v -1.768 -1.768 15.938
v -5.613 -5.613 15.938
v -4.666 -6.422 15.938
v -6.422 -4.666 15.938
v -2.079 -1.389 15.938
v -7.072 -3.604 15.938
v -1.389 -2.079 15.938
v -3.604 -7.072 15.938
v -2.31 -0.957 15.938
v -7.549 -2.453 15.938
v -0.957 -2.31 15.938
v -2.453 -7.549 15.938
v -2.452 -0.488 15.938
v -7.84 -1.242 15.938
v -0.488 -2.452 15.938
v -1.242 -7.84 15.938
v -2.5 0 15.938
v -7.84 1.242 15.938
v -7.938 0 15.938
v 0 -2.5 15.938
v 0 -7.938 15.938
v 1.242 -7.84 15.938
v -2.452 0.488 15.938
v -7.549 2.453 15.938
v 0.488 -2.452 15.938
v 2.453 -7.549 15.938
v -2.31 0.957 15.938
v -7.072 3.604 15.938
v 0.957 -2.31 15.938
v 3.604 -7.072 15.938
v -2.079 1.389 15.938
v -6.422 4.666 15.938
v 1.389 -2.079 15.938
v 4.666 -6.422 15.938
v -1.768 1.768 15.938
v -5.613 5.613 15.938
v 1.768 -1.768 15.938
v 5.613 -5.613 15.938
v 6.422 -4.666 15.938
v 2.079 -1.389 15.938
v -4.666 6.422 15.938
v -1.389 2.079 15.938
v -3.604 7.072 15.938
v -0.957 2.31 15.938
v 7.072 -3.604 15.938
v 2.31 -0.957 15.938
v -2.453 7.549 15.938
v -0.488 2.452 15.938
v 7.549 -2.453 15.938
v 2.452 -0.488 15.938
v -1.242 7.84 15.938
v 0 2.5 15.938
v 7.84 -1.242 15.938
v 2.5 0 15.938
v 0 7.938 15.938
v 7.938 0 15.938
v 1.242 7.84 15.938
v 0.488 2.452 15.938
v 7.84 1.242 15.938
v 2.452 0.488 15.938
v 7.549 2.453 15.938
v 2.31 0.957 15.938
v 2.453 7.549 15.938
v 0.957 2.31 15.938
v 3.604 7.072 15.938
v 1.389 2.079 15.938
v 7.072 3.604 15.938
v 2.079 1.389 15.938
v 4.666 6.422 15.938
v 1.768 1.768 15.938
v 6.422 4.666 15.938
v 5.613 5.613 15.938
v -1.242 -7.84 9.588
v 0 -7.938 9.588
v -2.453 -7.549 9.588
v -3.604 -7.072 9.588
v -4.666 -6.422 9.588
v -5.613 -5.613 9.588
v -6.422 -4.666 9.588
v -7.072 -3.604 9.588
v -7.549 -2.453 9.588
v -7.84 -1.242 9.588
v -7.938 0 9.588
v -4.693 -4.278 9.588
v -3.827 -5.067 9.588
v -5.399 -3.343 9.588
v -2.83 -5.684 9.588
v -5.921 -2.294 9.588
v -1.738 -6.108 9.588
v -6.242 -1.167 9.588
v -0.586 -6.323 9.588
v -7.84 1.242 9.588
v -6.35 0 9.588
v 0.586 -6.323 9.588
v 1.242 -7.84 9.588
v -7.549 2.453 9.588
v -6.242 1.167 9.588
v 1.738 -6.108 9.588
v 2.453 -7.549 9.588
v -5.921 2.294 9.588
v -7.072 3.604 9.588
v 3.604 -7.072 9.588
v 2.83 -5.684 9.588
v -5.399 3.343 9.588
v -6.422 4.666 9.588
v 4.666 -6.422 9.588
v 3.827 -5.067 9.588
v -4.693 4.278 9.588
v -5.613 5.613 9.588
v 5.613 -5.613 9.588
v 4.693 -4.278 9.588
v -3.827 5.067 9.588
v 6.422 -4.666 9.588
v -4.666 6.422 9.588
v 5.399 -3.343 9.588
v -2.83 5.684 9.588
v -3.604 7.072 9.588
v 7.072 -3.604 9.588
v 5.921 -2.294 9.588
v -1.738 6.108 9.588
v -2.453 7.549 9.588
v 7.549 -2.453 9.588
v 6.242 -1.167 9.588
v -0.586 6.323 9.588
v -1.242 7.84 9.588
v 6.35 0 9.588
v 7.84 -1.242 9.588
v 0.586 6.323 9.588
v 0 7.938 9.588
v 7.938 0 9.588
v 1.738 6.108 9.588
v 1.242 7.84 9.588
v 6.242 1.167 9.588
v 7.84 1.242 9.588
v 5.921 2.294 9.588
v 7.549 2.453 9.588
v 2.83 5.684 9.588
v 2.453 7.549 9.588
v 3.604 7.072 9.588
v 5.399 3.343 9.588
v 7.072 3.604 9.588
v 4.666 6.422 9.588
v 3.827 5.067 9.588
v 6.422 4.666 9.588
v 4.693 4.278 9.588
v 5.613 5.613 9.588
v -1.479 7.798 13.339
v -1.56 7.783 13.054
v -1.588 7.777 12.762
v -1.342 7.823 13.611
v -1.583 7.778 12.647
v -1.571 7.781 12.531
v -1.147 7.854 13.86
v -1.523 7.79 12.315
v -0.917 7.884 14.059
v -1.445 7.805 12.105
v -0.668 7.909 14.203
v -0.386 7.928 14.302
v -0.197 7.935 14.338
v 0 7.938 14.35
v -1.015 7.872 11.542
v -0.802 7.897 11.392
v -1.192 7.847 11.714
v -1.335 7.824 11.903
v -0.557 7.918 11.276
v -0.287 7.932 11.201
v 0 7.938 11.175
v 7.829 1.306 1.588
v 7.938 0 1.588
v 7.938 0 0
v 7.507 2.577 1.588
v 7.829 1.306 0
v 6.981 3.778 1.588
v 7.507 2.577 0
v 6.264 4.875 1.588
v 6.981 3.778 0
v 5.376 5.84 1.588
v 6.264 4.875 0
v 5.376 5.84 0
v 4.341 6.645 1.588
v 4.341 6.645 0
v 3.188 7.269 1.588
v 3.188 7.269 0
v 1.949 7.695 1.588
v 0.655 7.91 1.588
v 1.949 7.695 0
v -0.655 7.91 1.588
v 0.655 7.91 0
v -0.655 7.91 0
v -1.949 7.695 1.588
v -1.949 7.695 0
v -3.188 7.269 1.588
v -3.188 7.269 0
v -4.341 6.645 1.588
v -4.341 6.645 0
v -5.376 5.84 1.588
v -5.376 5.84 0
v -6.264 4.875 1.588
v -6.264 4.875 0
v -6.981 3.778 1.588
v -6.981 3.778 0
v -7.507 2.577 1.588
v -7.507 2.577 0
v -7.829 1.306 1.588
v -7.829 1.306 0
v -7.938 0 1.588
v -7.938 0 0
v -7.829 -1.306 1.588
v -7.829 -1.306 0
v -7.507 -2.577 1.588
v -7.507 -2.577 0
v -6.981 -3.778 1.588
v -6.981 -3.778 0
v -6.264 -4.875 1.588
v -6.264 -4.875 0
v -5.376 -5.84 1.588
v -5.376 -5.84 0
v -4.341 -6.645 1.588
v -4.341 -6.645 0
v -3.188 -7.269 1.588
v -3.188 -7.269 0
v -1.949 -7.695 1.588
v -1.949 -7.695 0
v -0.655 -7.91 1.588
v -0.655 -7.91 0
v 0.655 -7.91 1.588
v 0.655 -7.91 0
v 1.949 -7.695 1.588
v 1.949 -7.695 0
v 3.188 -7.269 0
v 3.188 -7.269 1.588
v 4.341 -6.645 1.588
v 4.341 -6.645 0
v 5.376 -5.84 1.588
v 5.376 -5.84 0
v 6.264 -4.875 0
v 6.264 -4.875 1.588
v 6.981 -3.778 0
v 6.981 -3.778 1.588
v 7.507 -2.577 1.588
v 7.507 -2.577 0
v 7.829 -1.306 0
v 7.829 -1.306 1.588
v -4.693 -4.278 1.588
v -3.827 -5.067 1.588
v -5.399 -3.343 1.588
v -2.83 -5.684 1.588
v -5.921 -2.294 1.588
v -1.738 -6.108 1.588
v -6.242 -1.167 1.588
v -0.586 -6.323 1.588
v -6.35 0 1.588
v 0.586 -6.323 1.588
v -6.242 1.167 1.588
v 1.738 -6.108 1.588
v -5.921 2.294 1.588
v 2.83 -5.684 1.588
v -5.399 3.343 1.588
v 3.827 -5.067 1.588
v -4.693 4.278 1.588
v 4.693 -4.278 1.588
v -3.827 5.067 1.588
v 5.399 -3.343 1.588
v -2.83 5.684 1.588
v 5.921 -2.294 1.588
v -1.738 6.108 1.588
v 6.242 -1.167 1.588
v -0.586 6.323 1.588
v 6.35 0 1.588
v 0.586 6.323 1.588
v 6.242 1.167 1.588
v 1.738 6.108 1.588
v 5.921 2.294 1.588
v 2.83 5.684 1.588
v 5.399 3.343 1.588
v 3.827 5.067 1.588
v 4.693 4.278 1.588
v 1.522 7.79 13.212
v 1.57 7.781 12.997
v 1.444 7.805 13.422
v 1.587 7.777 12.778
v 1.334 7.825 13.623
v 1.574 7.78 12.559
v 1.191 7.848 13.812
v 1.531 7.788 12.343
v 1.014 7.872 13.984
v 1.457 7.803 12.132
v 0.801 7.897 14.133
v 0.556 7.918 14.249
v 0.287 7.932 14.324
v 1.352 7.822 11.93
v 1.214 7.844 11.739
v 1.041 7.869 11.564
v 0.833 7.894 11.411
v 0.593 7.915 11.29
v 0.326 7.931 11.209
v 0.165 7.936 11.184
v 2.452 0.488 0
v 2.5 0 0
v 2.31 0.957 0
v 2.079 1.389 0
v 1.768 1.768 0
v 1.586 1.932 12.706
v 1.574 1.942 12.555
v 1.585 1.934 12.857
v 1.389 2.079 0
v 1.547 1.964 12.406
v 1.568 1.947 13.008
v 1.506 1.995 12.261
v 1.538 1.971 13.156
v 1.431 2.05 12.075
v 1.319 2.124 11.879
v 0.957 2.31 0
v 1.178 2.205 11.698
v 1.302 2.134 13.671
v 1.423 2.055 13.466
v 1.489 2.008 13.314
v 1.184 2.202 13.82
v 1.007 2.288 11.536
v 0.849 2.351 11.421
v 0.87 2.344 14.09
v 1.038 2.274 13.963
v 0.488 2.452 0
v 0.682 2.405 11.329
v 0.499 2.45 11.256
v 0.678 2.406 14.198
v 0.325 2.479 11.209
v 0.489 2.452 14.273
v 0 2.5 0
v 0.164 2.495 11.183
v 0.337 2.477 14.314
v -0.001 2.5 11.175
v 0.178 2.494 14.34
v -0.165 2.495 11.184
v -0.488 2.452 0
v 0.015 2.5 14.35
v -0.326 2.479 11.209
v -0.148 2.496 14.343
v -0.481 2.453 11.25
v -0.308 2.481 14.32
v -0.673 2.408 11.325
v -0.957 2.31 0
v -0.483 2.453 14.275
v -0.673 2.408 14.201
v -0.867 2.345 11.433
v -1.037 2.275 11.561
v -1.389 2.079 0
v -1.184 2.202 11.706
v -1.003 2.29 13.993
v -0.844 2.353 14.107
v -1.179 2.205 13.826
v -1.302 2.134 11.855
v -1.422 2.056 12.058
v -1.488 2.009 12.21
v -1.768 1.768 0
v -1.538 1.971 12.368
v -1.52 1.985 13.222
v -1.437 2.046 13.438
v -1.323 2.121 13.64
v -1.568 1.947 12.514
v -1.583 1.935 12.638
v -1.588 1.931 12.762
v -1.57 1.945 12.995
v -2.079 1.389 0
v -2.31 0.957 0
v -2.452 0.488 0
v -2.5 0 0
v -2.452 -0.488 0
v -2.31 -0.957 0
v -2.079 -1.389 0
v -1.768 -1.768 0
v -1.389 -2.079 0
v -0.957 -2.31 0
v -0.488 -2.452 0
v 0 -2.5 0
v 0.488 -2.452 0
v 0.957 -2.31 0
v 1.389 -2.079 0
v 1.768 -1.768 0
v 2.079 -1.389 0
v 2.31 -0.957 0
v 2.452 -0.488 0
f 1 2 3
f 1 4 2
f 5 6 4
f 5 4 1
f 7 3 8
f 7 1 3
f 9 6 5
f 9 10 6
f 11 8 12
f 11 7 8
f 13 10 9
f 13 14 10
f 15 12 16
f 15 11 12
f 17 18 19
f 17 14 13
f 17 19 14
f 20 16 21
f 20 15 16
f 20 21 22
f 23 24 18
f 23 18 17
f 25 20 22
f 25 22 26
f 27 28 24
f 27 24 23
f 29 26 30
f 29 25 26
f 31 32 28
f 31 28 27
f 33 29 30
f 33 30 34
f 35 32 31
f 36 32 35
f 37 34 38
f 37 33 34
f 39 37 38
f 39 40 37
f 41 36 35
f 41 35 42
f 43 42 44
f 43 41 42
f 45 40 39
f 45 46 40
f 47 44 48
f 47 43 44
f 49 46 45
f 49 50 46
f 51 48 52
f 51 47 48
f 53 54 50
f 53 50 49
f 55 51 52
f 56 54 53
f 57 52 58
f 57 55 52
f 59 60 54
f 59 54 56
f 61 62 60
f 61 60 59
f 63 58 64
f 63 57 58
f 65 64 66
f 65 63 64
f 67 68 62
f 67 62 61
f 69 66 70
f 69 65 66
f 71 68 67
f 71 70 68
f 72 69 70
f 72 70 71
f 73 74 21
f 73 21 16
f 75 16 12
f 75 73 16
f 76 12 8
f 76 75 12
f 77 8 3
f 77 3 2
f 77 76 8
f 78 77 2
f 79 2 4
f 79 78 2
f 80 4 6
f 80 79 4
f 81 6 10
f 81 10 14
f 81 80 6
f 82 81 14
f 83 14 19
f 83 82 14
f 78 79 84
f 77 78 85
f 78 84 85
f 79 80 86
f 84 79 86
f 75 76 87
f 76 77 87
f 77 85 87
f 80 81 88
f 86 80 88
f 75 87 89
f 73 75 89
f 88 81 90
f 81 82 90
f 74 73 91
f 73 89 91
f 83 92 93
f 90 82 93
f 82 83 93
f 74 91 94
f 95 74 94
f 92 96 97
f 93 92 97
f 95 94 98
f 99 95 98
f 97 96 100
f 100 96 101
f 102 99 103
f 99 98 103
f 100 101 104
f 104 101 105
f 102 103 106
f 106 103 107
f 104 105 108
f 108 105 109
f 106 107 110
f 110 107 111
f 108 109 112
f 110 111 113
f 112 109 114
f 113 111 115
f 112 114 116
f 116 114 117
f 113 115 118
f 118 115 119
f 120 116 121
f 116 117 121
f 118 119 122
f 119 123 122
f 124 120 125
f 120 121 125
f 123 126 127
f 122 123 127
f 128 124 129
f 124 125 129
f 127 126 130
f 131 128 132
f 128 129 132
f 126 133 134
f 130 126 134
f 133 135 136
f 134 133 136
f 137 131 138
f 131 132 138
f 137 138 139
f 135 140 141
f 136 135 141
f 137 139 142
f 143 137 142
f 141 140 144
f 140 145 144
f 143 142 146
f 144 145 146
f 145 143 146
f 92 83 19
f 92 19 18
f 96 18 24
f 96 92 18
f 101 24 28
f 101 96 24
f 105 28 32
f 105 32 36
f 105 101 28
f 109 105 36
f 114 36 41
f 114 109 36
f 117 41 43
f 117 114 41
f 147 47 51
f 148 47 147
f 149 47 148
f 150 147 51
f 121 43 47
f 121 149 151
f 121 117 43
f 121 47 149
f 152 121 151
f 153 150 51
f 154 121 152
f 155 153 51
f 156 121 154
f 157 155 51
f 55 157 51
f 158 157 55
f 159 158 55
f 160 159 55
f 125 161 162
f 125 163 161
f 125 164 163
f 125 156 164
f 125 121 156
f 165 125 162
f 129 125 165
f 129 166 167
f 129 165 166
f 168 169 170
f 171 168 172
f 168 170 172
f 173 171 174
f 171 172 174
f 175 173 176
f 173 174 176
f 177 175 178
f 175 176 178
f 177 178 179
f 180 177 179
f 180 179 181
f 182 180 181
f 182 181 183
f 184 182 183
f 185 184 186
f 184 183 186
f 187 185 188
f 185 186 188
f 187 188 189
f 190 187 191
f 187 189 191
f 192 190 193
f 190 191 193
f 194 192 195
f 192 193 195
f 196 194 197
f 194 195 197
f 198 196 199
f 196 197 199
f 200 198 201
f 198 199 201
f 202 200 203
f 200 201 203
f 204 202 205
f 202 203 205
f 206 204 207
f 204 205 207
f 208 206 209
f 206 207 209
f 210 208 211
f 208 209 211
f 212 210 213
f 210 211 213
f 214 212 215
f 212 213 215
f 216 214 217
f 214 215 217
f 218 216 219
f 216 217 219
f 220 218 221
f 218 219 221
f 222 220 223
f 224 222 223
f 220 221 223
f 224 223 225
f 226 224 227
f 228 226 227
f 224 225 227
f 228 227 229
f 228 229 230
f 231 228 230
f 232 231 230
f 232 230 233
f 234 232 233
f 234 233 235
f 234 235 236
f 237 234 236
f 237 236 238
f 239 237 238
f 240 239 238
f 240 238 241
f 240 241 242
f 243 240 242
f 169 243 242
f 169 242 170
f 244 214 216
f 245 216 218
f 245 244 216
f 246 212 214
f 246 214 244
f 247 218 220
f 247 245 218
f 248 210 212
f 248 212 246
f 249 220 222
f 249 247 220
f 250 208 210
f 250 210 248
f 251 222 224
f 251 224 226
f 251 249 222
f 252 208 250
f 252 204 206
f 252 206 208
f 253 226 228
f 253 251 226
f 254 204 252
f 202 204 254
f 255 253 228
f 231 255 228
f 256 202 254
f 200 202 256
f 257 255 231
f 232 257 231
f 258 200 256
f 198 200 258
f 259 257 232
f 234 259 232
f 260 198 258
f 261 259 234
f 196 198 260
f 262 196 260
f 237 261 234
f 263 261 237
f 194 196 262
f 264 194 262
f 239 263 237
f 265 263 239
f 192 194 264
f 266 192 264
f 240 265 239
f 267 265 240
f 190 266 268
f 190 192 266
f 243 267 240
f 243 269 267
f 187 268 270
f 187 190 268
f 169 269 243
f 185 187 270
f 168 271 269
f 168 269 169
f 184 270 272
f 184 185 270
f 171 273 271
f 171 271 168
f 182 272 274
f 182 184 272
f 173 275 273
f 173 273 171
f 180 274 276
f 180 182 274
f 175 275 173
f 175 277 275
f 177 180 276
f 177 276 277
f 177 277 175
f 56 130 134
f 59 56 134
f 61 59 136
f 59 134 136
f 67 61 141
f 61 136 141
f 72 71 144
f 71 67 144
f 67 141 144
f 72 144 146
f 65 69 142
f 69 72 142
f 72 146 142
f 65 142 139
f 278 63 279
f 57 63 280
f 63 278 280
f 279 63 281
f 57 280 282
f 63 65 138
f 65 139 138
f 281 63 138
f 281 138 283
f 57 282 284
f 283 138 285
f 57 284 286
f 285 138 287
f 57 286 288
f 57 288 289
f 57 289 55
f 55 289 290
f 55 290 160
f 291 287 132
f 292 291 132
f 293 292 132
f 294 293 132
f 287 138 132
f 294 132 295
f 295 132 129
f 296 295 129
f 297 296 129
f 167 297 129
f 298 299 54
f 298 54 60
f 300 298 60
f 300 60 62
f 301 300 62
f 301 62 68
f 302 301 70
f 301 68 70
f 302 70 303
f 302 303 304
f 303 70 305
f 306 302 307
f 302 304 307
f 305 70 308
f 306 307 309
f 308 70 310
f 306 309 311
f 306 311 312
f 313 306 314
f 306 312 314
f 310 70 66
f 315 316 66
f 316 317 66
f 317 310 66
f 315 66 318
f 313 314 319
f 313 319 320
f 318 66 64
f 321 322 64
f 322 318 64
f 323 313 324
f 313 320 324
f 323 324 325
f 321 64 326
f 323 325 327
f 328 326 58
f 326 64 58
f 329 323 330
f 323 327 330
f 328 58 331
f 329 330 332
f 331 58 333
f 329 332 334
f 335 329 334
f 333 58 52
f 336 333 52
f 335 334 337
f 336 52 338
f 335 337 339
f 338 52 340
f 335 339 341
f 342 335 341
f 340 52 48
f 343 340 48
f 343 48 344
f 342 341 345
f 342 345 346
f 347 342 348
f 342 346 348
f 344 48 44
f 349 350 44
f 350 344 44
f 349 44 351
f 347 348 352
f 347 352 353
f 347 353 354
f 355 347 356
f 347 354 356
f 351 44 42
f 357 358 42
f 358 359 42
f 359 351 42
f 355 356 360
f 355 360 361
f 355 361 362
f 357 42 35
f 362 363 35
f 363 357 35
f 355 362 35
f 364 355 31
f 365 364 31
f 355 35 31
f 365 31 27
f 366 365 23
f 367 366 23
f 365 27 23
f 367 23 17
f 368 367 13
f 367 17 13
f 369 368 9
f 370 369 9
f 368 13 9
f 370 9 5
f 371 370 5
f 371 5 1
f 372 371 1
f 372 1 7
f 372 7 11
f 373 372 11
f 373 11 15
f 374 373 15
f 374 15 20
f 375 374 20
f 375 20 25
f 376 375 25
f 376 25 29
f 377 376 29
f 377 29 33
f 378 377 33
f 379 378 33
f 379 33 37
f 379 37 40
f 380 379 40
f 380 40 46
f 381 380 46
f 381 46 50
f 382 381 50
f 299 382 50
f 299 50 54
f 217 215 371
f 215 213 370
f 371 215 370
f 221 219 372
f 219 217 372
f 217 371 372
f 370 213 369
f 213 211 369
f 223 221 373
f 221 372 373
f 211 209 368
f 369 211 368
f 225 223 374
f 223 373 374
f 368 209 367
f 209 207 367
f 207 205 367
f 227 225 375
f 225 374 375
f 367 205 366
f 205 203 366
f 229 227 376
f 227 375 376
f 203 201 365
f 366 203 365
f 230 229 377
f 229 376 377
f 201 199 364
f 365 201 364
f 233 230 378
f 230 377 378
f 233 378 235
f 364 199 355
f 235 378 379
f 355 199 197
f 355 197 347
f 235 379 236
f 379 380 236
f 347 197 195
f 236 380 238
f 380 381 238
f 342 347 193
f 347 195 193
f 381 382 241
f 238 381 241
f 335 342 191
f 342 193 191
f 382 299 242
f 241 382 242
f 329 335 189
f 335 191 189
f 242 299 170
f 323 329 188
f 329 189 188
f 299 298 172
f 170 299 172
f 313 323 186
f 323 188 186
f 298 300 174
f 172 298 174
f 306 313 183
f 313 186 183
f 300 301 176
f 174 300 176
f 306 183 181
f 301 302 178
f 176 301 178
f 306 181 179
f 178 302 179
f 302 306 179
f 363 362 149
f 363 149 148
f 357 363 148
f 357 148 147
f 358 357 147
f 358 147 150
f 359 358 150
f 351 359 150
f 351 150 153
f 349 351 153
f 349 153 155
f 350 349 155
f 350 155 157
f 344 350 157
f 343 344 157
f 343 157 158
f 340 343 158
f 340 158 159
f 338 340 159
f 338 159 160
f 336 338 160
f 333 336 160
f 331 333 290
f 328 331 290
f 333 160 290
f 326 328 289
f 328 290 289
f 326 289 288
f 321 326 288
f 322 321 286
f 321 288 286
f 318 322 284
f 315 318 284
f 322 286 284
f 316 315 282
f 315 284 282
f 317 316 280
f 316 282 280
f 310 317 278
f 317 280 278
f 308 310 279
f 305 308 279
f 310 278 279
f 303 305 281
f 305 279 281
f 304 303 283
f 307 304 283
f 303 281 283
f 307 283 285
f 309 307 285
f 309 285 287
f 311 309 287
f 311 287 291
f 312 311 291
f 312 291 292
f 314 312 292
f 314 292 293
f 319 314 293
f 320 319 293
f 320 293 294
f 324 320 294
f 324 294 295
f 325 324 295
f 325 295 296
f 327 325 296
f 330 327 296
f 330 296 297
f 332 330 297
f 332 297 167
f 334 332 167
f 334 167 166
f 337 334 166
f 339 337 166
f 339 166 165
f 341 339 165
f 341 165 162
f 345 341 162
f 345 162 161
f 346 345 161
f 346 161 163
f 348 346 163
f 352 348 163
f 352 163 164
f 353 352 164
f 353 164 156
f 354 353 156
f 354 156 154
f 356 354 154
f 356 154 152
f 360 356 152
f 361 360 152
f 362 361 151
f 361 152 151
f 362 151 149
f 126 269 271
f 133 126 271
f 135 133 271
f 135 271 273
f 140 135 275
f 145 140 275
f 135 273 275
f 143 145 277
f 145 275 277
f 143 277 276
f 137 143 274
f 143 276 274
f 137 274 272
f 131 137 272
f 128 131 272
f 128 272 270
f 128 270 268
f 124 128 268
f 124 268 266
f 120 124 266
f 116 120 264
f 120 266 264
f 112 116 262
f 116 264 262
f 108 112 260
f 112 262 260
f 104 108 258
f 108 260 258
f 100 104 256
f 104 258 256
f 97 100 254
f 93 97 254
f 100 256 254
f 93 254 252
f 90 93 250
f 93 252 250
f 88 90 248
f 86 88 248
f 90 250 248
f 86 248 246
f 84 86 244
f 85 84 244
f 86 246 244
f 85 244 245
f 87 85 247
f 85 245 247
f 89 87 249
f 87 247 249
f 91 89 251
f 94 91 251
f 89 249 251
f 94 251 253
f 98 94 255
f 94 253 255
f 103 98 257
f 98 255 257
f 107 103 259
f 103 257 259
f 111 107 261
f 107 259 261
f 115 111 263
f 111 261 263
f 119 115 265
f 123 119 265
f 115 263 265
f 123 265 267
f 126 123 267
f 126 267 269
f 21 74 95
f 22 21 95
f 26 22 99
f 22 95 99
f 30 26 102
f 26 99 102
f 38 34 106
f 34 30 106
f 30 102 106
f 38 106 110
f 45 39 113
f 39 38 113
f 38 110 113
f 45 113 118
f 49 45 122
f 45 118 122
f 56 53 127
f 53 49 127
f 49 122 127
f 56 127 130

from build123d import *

# Parameters (mm, degrees)
F0_R         = 7.9375
F1_DEPTH     = 1.5875
F2_R         = 6.35
F3_DEPTH     = 8
F4_W         = 15.875
F4_H         = 15.875
F5_DEPTH     = 6.35
F6_R         = 2.5
F7_DEPTH     = 15.9375
F8_R         = 1.5875
F9_REACH     = 20.3661280605
F10_T1_DEPTH = 46.0375


# Not quite as in the source:
# - a fillet or chamfer that OpenCascade refuses, or shapes differently, is made with other operations: its cross-section is extruded or revolved along the edge and cut away or added


with BuildPart() as f1:
    # F0 (on Top) → F1 (new body)
    with BuildSketch(Plane.XY):
        Circle(F0_R)
    extrude(amount=F1_DEPTH)

    # F2 (on face) → F3 (join)
    with BuildSketch(Plane.XY.offset(1.5875)):
        Circle(F2_R)
    extrude(amount=F3_DEPTH)

    # F4 (on face) → F5 (join)
    with BuildSketch(Plane.XY.offset(9.5875)):
        Rectangle(F4_W, F4_H)
    extrude(amount=F5_DEPTH)

    # F6 (on face) → F7 (cut, through all)
    with BuildSketch(Plane.XY.offset(15.9375)):
        Circle(F6_R)
    extrude(amount=-F7_DEPTH, mode=Mode.SUBTRACT)

    f9_end = f1.faces().sort_by_distance((-2.5, 0, 7.96875))[0]
    # F8 (on face) → F9 (cut, up to a face of the model that its end follows)
    with BuildSketch(Plane(origin=(0, 7.9375, 0), x_dir=(-1, 0, 0), z_dir=(0, 1, 0))):
        with Locations((0, 12.7625)):
            Circle(F8_R)
    f9_long = extrude(amount=-F9_REACH, mode=Mode.PRIVATE)
    add(split(f9_long, bisect_by=f9_end, keep=Keep.ALL, mode=Mode.PRIVATE).solids().sort_by_distance((0, 7.9375, 12.7625))[0], mode=Mode.SUBTRACT)

    # F10: fillet of radius 7.9375 on 4 edges, made by hand

    # F10_s2 → F10_t1 (cut)
    with BuildSketch(Plane.XY.offset(-10.25625)):
        with BuildLine():
            ThreePointArc((-7.9375, 0), (-5.6126600757, 5.6126600757), (0, 7.9375))
            Line((0, 7.9375), (-7.9375, 7.9375))
            Line((-7.9375, 7.9375), (-7.9375, 0))
        make_face()
        with BuildLine():
            ThreePointArc((0, -7.9375), (-5.6126600757, -5.6126600757), (-7.9375, 0))
            Line((-7.9375, 0), (-7.9375, -7.9375))
            Line((-7.9375, -7.9375), (0, -7.9375))
        make_face()
        with BuildLine():
            ThreePointArc((7.9375, 0), (5.6126600757, 5.6126600757), (0, 7.9375))
            Line((0, 7.9375), (7.9375, 7.9375))
            Line((7.9375, 7.9375), (7.9375, 0))
        make_face()
        with BuildLine():
            ThreePointArc((0, -7.9375), (5.6126600757, -5.6126600757), (7.9375, 0))
            Line((7.9375, 0), (7.9375, -7.9375))
            Line((7.9375, -7.9375), (0, -7.9375))
        make_face()
    extrude(amount=F10_T1_DEPTH, mode=Mode.SUBTRACT)


solid = f1.part
